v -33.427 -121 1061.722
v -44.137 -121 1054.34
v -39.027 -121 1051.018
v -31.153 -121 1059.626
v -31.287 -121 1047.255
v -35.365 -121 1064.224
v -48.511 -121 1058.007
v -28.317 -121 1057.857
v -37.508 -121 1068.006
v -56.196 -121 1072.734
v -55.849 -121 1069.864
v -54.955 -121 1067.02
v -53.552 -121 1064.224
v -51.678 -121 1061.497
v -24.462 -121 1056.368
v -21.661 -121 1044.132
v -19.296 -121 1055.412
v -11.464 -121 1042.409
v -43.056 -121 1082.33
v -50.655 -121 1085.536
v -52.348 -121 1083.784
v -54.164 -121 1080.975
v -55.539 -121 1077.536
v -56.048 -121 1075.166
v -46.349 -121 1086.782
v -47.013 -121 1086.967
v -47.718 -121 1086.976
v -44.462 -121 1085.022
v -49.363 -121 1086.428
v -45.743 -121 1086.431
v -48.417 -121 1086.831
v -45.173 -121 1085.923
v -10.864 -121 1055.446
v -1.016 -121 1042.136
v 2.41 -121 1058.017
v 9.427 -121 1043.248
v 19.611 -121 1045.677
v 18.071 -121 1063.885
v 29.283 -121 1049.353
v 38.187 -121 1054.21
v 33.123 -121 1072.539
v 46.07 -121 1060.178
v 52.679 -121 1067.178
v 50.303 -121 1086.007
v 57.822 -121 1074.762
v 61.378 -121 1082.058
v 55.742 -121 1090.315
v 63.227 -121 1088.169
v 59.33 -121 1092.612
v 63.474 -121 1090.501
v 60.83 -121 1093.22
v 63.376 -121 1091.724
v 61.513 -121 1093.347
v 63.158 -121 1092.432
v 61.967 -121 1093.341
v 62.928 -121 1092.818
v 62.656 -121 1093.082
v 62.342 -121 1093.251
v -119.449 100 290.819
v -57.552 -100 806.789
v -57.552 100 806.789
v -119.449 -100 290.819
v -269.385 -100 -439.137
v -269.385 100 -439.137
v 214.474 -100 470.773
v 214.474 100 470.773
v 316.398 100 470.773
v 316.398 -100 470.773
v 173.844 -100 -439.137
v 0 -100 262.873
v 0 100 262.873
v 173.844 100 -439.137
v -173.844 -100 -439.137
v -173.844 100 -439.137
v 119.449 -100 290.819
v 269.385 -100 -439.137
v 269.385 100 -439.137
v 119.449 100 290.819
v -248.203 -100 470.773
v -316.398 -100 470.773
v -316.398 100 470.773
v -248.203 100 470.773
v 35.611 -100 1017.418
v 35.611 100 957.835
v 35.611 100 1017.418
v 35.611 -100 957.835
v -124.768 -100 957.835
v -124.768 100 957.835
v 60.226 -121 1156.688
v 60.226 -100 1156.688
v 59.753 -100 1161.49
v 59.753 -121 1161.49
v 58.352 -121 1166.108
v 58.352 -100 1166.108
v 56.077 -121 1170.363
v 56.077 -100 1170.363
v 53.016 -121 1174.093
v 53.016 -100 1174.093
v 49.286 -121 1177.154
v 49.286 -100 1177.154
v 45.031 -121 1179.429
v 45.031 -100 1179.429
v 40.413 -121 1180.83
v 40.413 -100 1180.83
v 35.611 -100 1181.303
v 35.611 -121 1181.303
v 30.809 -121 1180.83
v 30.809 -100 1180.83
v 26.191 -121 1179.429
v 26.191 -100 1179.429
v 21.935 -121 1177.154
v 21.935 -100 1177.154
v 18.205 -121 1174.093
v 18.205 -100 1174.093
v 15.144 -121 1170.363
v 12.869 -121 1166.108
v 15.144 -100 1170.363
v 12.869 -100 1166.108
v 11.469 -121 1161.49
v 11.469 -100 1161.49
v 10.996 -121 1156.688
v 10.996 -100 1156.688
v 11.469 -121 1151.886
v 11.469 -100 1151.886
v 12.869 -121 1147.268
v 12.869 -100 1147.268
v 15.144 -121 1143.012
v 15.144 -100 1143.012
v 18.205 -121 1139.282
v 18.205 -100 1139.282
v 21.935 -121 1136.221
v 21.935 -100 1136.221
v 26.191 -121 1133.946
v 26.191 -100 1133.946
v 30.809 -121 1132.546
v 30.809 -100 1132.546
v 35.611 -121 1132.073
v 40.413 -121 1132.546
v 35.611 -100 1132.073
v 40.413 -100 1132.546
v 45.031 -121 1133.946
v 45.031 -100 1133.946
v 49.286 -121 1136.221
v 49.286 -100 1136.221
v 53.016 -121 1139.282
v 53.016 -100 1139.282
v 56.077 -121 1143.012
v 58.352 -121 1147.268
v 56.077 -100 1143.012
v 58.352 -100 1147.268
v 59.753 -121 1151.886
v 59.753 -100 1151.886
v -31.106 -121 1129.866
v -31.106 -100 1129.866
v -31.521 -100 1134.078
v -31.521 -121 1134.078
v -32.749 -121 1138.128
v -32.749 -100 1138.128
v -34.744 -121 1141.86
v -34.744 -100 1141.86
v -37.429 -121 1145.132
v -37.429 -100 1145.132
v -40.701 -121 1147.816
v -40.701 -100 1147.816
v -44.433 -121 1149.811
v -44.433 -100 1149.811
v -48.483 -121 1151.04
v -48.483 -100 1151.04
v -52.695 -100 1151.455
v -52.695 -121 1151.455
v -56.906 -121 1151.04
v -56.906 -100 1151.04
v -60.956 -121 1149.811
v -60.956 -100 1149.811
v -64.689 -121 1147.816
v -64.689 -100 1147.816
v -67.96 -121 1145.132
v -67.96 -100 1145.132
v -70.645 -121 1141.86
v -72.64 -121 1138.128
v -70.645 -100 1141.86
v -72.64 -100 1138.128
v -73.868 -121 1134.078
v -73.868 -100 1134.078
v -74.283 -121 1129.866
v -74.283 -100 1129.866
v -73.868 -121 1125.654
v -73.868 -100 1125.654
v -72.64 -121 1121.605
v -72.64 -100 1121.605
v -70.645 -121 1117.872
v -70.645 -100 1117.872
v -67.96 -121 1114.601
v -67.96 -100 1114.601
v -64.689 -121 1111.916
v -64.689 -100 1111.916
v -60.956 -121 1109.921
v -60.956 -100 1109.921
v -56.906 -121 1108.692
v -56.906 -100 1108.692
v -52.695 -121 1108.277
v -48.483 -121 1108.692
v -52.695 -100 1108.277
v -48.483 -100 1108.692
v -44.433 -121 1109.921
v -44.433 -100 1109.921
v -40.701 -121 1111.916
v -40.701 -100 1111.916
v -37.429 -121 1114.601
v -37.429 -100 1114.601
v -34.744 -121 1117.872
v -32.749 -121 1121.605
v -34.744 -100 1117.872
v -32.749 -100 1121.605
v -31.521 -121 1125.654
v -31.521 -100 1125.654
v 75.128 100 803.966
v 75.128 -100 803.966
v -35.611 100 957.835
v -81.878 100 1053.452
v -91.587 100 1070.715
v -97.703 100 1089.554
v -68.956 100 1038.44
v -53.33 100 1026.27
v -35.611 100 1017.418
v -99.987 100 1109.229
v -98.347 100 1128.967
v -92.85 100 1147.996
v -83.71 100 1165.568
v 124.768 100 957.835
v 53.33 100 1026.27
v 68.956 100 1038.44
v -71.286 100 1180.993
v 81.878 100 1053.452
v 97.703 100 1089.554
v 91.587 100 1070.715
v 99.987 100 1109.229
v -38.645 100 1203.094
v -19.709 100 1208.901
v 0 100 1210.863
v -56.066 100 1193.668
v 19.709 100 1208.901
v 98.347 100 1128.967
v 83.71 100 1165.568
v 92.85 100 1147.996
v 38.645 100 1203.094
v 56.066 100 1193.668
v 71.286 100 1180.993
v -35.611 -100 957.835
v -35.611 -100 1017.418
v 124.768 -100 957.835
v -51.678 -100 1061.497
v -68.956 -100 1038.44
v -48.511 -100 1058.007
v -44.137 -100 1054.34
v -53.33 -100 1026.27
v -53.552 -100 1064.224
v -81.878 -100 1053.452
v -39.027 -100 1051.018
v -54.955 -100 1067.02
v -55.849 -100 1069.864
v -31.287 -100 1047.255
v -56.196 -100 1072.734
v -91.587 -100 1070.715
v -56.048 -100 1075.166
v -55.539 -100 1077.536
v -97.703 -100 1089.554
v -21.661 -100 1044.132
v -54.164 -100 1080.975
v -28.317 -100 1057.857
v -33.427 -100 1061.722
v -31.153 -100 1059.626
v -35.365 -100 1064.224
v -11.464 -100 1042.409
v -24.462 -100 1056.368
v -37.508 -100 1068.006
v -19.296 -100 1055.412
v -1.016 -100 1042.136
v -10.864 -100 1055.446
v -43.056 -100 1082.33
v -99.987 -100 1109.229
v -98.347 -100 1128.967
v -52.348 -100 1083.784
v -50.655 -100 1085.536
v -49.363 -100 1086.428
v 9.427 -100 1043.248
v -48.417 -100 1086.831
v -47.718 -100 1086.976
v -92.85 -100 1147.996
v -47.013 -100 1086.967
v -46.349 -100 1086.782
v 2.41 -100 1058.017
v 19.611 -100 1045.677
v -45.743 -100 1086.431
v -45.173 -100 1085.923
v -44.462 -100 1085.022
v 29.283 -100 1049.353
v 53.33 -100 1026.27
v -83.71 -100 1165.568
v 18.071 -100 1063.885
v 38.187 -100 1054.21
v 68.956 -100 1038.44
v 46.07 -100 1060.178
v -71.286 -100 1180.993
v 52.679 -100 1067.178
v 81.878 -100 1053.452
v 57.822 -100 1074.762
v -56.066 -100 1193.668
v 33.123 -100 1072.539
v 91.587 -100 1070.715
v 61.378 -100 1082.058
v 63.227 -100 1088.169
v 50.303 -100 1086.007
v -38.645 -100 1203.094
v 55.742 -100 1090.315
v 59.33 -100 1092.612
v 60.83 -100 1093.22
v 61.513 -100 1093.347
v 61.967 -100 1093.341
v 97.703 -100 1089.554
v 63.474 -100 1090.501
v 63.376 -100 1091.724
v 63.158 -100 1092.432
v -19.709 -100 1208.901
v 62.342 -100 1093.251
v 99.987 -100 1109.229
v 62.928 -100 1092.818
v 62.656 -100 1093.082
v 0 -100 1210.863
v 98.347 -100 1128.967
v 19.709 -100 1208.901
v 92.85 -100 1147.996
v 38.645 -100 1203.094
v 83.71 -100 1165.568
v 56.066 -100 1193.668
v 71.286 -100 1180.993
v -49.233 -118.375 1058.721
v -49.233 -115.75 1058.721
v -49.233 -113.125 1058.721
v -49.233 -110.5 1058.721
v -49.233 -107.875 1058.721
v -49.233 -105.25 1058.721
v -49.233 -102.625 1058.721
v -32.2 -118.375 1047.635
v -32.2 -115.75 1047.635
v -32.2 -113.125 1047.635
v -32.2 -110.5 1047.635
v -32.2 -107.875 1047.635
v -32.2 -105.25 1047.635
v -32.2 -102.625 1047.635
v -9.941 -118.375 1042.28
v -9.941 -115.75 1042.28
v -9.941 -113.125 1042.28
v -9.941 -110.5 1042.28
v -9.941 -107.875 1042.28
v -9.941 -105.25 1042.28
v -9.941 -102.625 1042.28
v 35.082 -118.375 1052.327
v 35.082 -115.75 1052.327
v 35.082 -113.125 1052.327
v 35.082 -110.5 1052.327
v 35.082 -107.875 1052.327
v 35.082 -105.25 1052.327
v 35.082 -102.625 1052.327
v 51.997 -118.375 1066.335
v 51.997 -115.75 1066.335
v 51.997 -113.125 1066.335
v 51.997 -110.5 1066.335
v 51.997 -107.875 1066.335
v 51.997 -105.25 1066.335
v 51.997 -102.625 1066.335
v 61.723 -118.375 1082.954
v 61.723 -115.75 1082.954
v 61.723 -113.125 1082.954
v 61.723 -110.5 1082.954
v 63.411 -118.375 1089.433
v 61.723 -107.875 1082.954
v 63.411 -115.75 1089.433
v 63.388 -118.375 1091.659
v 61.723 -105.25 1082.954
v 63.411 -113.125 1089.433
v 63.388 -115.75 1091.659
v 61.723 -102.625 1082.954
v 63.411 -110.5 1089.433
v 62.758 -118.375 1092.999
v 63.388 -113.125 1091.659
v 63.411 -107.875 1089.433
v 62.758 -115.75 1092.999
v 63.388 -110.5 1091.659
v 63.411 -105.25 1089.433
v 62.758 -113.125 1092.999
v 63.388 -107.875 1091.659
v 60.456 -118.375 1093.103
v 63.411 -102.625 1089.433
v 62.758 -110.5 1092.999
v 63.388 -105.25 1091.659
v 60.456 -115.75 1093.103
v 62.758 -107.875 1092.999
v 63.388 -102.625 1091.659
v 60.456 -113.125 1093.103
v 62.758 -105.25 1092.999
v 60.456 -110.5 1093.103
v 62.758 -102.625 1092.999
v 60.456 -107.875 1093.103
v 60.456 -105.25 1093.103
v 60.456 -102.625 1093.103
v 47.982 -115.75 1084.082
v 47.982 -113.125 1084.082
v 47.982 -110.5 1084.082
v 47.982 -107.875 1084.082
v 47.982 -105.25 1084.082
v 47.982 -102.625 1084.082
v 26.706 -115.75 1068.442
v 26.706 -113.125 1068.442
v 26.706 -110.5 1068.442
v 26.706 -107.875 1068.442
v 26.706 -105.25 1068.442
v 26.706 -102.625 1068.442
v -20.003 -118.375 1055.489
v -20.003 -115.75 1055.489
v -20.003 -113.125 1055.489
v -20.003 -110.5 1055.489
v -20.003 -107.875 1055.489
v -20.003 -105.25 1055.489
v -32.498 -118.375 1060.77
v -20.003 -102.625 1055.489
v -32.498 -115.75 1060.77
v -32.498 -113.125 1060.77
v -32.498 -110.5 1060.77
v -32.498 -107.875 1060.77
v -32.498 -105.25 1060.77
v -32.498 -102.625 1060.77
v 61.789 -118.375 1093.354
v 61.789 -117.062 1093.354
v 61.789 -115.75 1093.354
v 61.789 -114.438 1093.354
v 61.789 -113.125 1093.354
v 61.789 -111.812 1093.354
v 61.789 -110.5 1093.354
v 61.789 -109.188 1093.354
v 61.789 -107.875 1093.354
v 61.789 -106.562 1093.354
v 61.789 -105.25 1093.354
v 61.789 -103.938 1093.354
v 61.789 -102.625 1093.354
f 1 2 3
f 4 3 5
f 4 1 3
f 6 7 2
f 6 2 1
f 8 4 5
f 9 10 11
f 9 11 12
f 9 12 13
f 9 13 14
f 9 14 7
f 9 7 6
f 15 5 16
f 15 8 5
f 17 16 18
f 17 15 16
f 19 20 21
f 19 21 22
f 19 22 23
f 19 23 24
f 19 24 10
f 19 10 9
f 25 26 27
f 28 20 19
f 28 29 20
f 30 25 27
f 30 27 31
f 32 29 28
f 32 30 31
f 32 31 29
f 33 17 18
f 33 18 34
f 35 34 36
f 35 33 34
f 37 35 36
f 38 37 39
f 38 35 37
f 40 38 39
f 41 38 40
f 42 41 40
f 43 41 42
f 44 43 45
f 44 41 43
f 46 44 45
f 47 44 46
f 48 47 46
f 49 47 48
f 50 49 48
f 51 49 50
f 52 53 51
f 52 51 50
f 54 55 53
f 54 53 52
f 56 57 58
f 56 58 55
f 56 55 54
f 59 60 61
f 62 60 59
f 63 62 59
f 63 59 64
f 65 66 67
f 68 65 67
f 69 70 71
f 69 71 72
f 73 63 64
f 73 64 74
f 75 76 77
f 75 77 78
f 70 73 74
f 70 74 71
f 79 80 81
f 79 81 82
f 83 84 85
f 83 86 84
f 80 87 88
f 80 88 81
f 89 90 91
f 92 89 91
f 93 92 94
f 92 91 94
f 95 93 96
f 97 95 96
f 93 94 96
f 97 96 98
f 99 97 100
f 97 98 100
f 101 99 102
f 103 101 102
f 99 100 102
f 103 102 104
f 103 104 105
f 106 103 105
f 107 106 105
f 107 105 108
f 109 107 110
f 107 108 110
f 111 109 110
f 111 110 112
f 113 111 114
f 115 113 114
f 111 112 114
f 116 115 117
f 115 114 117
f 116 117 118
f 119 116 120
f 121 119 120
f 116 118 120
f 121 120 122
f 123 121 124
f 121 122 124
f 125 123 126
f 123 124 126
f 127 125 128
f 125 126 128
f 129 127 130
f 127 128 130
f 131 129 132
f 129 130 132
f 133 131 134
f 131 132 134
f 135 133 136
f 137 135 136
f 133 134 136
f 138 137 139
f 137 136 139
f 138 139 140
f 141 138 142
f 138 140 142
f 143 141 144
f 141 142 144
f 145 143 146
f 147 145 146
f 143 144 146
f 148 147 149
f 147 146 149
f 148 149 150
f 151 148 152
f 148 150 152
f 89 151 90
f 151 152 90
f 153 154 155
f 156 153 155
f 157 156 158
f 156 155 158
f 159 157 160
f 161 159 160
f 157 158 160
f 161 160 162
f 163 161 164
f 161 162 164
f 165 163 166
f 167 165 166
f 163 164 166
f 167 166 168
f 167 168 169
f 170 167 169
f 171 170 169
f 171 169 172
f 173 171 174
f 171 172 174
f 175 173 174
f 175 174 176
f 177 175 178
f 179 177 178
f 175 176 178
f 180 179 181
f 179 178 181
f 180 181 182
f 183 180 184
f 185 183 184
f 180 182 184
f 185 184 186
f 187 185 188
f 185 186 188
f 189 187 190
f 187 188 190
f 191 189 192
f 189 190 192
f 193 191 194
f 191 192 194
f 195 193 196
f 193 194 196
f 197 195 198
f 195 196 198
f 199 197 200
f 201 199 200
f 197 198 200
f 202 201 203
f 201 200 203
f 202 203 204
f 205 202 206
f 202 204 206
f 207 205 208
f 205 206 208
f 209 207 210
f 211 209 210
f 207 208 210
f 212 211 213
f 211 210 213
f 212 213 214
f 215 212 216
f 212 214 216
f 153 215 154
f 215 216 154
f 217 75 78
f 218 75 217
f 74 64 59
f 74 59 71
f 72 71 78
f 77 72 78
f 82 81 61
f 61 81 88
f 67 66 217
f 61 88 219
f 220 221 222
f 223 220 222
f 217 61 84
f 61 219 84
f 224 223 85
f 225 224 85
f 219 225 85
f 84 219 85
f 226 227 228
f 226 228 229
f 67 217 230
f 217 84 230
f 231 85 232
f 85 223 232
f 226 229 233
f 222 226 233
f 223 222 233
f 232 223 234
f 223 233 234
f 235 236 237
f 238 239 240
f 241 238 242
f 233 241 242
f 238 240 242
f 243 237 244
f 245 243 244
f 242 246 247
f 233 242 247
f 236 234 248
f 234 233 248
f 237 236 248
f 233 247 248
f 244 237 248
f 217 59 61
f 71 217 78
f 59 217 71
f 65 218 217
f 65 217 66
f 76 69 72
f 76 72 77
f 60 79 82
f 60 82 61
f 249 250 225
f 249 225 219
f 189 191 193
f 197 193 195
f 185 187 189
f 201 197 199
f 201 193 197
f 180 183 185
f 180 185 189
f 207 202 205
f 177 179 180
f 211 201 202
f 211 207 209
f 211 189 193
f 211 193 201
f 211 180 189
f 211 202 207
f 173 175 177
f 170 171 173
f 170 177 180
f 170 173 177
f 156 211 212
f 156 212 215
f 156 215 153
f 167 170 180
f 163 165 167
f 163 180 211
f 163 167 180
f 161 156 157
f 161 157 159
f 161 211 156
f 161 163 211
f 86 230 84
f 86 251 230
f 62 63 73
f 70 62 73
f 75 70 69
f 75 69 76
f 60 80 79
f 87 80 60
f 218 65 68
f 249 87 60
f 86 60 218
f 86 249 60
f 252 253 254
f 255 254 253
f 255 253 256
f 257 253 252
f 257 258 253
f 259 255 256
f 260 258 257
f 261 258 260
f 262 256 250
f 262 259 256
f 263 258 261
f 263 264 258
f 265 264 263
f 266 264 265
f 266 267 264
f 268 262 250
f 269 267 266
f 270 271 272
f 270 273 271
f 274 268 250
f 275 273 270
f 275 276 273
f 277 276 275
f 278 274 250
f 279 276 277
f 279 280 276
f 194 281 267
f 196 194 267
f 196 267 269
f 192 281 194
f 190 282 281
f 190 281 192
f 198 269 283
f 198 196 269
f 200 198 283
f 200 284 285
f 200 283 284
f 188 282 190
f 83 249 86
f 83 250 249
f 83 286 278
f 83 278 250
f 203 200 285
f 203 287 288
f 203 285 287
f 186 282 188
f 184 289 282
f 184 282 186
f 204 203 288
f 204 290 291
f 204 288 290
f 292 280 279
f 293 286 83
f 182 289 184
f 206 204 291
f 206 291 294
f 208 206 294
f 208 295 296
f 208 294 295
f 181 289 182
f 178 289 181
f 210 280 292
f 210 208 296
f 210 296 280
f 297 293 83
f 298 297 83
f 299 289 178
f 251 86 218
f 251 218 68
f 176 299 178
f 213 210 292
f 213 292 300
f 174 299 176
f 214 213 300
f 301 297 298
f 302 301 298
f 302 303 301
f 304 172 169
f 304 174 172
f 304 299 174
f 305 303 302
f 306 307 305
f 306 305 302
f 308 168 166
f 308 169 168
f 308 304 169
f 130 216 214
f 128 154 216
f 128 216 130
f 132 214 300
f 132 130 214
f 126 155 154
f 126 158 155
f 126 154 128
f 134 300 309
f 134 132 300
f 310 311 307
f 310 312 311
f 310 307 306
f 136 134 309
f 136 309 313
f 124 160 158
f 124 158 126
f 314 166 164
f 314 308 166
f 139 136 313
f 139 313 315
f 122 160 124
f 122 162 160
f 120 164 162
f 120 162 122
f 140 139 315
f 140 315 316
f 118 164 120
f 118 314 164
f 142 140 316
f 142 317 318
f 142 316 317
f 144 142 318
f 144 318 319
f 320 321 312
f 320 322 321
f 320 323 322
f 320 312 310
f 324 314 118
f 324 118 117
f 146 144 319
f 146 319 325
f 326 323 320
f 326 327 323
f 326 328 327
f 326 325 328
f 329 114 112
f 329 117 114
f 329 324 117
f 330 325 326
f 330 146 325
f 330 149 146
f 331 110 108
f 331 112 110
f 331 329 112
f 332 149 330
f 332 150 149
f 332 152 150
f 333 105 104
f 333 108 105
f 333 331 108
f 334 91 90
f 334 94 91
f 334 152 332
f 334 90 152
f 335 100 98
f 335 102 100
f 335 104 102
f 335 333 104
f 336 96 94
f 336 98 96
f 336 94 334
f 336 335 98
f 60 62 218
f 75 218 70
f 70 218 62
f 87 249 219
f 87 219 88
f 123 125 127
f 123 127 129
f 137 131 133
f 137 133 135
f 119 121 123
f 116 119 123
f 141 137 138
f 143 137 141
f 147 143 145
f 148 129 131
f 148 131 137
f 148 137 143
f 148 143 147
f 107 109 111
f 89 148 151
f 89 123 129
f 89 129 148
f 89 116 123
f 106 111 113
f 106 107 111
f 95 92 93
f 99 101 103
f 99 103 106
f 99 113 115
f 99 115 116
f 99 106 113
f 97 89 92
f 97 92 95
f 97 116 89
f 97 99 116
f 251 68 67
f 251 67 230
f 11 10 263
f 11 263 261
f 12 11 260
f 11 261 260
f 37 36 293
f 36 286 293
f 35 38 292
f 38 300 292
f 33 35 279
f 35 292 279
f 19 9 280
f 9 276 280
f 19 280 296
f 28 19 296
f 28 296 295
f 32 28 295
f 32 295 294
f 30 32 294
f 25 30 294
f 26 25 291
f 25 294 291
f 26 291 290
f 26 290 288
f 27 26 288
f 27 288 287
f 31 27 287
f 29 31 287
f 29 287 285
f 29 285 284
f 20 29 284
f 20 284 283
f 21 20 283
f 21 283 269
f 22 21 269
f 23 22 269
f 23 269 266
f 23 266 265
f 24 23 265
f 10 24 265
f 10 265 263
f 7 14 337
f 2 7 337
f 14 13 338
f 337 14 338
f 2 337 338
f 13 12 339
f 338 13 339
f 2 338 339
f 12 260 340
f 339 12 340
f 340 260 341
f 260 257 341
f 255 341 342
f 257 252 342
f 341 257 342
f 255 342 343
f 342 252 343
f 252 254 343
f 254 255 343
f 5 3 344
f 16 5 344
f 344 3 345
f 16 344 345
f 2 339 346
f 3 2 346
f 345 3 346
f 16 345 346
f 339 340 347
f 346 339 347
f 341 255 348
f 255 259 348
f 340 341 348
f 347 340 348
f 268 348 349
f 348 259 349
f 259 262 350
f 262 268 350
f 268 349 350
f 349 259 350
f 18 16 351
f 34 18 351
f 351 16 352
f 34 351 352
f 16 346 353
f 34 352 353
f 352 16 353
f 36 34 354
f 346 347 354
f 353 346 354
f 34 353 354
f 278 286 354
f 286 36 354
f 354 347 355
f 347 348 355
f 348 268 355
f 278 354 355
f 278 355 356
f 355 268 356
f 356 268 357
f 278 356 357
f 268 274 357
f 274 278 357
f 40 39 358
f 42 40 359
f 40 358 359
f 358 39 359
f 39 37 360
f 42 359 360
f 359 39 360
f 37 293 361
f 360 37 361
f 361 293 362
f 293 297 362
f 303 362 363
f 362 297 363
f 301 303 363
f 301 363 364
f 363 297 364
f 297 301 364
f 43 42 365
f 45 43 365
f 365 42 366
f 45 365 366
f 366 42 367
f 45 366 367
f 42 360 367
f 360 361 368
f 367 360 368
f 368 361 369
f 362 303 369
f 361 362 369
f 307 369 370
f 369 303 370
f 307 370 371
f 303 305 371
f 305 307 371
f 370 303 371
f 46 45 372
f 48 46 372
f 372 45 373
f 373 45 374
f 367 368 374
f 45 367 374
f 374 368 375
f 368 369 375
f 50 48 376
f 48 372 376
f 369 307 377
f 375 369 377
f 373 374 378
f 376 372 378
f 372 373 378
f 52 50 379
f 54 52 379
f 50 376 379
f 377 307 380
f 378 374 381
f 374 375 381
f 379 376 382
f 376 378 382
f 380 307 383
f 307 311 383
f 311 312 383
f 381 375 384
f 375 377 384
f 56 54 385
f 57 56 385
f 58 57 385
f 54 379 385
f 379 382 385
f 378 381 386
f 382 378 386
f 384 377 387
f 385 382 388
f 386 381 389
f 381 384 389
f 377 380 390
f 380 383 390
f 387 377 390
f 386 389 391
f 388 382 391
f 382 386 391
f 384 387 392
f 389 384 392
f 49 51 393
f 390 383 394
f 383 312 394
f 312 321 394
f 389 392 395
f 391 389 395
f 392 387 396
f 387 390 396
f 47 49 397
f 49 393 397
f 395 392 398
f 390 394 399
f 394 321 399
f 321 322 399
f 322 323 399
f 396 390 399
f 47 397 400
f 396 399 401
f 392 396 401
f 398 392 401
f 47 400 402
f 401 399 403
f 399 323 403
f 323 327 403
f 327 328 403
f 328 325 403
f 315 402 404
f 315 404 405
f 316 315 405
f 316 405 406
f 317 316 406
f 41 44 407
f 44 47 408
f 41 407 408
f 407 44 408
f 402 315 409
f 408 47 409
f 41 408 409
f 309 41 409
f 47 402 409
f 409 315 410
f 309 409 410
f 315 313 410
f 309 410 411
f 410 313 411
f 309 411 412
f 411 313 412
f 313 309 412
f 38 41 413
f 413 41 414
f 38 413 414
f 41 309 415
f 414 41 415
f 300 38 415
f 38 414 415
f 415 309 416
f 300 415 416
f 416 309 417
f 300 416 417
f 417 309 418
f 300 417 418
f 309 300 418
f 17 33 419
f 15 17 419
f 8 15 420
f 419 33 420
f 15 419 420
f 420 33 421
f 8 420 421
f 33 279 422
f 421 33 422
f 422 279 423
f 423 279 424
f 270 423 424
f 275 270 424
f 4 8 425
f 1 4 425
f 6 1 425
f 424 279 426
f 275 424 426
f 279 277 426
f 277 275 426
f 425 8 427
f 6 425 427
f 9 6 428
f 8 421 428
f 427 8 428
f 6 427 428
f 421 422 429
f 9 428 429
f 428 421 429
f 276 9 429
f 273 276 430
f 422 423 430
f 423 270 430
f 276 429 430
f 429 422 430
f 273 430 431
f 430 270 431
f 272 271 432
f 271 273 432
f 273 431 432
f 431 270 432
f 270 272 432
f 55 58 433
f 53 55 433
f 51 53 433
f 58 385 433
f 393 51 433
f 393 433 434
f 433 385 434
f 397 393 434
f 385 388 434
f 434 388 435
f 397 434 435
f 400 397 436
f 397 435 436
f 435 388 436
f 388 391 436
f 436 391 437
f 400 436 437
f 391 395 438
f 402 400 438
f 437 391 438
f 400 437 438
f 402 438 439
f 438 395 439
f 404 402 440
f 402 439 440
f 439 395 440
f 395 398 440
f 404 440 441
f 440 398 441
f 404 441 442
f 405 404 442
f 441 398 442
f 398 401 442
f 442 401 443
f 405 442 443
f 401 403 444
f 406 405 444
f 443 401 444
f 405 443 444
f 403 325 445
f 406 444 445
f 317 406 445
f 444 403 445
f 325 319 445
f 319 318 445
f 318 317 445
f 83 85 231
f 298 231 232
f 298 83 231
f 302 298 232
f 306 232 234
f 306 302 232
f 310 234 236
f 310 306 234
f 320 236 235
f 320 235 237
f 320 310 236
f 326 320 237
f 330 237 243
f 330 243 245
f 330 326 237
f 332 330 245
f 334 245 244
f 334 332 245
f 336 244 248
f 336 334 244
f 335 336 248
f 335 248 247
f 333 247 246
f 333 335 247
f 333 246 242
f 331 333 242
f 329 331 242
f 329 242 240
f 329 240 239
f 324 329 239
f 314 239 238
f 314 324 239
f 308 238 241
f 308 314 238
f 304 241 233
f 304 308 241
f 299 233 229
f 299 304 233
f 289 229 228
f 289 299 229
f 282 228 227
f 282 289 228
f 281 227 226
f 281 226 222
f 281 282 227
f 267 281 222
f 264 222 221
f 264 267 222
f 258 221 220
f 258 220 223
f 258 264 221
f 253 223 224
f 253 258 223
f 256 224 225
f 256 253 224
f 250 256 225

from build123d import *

# Parameters (mm, degrees)
F1_DEPTH = 100
F2_R     = 21.5886417048
F2_R_2   = 24.6150282736
F3_DEPTH = 21


with BuildPart() as f1:
    # F0 (on Front) → F1 (new body, symmetric)
    with BuildSketch(Plane.XZ):
        with BuildLine():
            ThreePointArc((35.6107763946, 1017.418384552), (98.3474680479, 1128.9674460156), (0, 1210.8628739806))
            ThreePointArc((0, 1210.8628739806), (-98.3474680479, 1128.9674460156), (-35.6107763946, 1017.418384552))
            Line((-35.6107763946, 1017.418384552), (-35.6107763946, 957.8346954225))
            Line((-35.6107763946, 957.8346954225), (-124.767777348, 957.8346954225))
            Line((-124.767777348, 957.8346954225), (-316.3984388356, 470.7734332918))
            Line((-316.3984388356, 470.7734332918), (-248.2028006078, 470.7734332918))
            Line((-248.2028006078, 470.7734332918), (-57.5520955026, 806.7892193794))
            Line((-57.5520955026, 806.7892193794), (-119.449198246, 290.8188700676))
            Line((-119.449198246, 290.8188700676), (-269.3851142813, -439.1371260194))
            Line((-269.3851142813, -439.1371260194), (-173.8435637442, -439.1371260194))
            Line((-173.8435637442, -439.1371260194), (0, 262.8727257252))
            Line((0, 262.8727257252), (173.8435637442, -439.1371260194))
            Line((173.8435637442, -439.1371260194), (269.3851142813, -439.1371260194))
            Line((269.3851142813, -439.1371260194), (119.449198246, 290.8188700676))
            Line((119.449198246, 290.8188700676), (75.1282572746, 803.9661645889))
            Line((75.1282572746, 803.9661645889), (214.4739990169, 470.7734332918))
            Line((214.4739990169, 470.7734332918), (316.3984388356, 470.7734332918))
            Line((316.3984388356, 470.7734332918), (124.767777348, 957.8346954225))
            Line((124.767777348, 957.8346954225), (35.6107763946, 957.8346954225))
            Line((35.6107763946, 957.8346954225), (35.6107763946, 1017.418384552))
        make_face()
    extrude(amount=F1_DEPTH, both=True)

    # F2 (on face) → F3 (join)
    with BuildSketch(Plane.XZ.offset(100)):
        with Locations((-52.6945628226, 1129.8661231995)):
            Circle(F2_R)
        with Locations((35.6107763946, 1156.6877365112)):
            Circle(F2_R_2)
        with BuildLine():
            add(Edge.make_bspline(
                [(-56.1959594488, 1072.7338790894), (-55.924177507, 1059.9617369508), (-16.9304138442, 1031.8550429672), (52.9069858404, 1052.444888033), (68.8536482627, 1100.9438511252), (46.6390210232, 1083.2507084319), (20.7228541214, 1060.5728618004), (-39.3811416258, 1046.8222391451), (-42.433383012, 1098.137824899), (-56.3583007079, 1080.3629571017), (-56.1959594488, 1072.7338790894)],
                knots=[0, 0, 0, 0, 0.1448792193, 0.3216273429, 0.4396148241, 0.51965969, 0.6525806211, 0.7994169759, 0.9134604944, 1, 1, 1, 1], degree=3))
        make_face()
    extrude(amount=F3_DEPTH)


solid = f1.part
